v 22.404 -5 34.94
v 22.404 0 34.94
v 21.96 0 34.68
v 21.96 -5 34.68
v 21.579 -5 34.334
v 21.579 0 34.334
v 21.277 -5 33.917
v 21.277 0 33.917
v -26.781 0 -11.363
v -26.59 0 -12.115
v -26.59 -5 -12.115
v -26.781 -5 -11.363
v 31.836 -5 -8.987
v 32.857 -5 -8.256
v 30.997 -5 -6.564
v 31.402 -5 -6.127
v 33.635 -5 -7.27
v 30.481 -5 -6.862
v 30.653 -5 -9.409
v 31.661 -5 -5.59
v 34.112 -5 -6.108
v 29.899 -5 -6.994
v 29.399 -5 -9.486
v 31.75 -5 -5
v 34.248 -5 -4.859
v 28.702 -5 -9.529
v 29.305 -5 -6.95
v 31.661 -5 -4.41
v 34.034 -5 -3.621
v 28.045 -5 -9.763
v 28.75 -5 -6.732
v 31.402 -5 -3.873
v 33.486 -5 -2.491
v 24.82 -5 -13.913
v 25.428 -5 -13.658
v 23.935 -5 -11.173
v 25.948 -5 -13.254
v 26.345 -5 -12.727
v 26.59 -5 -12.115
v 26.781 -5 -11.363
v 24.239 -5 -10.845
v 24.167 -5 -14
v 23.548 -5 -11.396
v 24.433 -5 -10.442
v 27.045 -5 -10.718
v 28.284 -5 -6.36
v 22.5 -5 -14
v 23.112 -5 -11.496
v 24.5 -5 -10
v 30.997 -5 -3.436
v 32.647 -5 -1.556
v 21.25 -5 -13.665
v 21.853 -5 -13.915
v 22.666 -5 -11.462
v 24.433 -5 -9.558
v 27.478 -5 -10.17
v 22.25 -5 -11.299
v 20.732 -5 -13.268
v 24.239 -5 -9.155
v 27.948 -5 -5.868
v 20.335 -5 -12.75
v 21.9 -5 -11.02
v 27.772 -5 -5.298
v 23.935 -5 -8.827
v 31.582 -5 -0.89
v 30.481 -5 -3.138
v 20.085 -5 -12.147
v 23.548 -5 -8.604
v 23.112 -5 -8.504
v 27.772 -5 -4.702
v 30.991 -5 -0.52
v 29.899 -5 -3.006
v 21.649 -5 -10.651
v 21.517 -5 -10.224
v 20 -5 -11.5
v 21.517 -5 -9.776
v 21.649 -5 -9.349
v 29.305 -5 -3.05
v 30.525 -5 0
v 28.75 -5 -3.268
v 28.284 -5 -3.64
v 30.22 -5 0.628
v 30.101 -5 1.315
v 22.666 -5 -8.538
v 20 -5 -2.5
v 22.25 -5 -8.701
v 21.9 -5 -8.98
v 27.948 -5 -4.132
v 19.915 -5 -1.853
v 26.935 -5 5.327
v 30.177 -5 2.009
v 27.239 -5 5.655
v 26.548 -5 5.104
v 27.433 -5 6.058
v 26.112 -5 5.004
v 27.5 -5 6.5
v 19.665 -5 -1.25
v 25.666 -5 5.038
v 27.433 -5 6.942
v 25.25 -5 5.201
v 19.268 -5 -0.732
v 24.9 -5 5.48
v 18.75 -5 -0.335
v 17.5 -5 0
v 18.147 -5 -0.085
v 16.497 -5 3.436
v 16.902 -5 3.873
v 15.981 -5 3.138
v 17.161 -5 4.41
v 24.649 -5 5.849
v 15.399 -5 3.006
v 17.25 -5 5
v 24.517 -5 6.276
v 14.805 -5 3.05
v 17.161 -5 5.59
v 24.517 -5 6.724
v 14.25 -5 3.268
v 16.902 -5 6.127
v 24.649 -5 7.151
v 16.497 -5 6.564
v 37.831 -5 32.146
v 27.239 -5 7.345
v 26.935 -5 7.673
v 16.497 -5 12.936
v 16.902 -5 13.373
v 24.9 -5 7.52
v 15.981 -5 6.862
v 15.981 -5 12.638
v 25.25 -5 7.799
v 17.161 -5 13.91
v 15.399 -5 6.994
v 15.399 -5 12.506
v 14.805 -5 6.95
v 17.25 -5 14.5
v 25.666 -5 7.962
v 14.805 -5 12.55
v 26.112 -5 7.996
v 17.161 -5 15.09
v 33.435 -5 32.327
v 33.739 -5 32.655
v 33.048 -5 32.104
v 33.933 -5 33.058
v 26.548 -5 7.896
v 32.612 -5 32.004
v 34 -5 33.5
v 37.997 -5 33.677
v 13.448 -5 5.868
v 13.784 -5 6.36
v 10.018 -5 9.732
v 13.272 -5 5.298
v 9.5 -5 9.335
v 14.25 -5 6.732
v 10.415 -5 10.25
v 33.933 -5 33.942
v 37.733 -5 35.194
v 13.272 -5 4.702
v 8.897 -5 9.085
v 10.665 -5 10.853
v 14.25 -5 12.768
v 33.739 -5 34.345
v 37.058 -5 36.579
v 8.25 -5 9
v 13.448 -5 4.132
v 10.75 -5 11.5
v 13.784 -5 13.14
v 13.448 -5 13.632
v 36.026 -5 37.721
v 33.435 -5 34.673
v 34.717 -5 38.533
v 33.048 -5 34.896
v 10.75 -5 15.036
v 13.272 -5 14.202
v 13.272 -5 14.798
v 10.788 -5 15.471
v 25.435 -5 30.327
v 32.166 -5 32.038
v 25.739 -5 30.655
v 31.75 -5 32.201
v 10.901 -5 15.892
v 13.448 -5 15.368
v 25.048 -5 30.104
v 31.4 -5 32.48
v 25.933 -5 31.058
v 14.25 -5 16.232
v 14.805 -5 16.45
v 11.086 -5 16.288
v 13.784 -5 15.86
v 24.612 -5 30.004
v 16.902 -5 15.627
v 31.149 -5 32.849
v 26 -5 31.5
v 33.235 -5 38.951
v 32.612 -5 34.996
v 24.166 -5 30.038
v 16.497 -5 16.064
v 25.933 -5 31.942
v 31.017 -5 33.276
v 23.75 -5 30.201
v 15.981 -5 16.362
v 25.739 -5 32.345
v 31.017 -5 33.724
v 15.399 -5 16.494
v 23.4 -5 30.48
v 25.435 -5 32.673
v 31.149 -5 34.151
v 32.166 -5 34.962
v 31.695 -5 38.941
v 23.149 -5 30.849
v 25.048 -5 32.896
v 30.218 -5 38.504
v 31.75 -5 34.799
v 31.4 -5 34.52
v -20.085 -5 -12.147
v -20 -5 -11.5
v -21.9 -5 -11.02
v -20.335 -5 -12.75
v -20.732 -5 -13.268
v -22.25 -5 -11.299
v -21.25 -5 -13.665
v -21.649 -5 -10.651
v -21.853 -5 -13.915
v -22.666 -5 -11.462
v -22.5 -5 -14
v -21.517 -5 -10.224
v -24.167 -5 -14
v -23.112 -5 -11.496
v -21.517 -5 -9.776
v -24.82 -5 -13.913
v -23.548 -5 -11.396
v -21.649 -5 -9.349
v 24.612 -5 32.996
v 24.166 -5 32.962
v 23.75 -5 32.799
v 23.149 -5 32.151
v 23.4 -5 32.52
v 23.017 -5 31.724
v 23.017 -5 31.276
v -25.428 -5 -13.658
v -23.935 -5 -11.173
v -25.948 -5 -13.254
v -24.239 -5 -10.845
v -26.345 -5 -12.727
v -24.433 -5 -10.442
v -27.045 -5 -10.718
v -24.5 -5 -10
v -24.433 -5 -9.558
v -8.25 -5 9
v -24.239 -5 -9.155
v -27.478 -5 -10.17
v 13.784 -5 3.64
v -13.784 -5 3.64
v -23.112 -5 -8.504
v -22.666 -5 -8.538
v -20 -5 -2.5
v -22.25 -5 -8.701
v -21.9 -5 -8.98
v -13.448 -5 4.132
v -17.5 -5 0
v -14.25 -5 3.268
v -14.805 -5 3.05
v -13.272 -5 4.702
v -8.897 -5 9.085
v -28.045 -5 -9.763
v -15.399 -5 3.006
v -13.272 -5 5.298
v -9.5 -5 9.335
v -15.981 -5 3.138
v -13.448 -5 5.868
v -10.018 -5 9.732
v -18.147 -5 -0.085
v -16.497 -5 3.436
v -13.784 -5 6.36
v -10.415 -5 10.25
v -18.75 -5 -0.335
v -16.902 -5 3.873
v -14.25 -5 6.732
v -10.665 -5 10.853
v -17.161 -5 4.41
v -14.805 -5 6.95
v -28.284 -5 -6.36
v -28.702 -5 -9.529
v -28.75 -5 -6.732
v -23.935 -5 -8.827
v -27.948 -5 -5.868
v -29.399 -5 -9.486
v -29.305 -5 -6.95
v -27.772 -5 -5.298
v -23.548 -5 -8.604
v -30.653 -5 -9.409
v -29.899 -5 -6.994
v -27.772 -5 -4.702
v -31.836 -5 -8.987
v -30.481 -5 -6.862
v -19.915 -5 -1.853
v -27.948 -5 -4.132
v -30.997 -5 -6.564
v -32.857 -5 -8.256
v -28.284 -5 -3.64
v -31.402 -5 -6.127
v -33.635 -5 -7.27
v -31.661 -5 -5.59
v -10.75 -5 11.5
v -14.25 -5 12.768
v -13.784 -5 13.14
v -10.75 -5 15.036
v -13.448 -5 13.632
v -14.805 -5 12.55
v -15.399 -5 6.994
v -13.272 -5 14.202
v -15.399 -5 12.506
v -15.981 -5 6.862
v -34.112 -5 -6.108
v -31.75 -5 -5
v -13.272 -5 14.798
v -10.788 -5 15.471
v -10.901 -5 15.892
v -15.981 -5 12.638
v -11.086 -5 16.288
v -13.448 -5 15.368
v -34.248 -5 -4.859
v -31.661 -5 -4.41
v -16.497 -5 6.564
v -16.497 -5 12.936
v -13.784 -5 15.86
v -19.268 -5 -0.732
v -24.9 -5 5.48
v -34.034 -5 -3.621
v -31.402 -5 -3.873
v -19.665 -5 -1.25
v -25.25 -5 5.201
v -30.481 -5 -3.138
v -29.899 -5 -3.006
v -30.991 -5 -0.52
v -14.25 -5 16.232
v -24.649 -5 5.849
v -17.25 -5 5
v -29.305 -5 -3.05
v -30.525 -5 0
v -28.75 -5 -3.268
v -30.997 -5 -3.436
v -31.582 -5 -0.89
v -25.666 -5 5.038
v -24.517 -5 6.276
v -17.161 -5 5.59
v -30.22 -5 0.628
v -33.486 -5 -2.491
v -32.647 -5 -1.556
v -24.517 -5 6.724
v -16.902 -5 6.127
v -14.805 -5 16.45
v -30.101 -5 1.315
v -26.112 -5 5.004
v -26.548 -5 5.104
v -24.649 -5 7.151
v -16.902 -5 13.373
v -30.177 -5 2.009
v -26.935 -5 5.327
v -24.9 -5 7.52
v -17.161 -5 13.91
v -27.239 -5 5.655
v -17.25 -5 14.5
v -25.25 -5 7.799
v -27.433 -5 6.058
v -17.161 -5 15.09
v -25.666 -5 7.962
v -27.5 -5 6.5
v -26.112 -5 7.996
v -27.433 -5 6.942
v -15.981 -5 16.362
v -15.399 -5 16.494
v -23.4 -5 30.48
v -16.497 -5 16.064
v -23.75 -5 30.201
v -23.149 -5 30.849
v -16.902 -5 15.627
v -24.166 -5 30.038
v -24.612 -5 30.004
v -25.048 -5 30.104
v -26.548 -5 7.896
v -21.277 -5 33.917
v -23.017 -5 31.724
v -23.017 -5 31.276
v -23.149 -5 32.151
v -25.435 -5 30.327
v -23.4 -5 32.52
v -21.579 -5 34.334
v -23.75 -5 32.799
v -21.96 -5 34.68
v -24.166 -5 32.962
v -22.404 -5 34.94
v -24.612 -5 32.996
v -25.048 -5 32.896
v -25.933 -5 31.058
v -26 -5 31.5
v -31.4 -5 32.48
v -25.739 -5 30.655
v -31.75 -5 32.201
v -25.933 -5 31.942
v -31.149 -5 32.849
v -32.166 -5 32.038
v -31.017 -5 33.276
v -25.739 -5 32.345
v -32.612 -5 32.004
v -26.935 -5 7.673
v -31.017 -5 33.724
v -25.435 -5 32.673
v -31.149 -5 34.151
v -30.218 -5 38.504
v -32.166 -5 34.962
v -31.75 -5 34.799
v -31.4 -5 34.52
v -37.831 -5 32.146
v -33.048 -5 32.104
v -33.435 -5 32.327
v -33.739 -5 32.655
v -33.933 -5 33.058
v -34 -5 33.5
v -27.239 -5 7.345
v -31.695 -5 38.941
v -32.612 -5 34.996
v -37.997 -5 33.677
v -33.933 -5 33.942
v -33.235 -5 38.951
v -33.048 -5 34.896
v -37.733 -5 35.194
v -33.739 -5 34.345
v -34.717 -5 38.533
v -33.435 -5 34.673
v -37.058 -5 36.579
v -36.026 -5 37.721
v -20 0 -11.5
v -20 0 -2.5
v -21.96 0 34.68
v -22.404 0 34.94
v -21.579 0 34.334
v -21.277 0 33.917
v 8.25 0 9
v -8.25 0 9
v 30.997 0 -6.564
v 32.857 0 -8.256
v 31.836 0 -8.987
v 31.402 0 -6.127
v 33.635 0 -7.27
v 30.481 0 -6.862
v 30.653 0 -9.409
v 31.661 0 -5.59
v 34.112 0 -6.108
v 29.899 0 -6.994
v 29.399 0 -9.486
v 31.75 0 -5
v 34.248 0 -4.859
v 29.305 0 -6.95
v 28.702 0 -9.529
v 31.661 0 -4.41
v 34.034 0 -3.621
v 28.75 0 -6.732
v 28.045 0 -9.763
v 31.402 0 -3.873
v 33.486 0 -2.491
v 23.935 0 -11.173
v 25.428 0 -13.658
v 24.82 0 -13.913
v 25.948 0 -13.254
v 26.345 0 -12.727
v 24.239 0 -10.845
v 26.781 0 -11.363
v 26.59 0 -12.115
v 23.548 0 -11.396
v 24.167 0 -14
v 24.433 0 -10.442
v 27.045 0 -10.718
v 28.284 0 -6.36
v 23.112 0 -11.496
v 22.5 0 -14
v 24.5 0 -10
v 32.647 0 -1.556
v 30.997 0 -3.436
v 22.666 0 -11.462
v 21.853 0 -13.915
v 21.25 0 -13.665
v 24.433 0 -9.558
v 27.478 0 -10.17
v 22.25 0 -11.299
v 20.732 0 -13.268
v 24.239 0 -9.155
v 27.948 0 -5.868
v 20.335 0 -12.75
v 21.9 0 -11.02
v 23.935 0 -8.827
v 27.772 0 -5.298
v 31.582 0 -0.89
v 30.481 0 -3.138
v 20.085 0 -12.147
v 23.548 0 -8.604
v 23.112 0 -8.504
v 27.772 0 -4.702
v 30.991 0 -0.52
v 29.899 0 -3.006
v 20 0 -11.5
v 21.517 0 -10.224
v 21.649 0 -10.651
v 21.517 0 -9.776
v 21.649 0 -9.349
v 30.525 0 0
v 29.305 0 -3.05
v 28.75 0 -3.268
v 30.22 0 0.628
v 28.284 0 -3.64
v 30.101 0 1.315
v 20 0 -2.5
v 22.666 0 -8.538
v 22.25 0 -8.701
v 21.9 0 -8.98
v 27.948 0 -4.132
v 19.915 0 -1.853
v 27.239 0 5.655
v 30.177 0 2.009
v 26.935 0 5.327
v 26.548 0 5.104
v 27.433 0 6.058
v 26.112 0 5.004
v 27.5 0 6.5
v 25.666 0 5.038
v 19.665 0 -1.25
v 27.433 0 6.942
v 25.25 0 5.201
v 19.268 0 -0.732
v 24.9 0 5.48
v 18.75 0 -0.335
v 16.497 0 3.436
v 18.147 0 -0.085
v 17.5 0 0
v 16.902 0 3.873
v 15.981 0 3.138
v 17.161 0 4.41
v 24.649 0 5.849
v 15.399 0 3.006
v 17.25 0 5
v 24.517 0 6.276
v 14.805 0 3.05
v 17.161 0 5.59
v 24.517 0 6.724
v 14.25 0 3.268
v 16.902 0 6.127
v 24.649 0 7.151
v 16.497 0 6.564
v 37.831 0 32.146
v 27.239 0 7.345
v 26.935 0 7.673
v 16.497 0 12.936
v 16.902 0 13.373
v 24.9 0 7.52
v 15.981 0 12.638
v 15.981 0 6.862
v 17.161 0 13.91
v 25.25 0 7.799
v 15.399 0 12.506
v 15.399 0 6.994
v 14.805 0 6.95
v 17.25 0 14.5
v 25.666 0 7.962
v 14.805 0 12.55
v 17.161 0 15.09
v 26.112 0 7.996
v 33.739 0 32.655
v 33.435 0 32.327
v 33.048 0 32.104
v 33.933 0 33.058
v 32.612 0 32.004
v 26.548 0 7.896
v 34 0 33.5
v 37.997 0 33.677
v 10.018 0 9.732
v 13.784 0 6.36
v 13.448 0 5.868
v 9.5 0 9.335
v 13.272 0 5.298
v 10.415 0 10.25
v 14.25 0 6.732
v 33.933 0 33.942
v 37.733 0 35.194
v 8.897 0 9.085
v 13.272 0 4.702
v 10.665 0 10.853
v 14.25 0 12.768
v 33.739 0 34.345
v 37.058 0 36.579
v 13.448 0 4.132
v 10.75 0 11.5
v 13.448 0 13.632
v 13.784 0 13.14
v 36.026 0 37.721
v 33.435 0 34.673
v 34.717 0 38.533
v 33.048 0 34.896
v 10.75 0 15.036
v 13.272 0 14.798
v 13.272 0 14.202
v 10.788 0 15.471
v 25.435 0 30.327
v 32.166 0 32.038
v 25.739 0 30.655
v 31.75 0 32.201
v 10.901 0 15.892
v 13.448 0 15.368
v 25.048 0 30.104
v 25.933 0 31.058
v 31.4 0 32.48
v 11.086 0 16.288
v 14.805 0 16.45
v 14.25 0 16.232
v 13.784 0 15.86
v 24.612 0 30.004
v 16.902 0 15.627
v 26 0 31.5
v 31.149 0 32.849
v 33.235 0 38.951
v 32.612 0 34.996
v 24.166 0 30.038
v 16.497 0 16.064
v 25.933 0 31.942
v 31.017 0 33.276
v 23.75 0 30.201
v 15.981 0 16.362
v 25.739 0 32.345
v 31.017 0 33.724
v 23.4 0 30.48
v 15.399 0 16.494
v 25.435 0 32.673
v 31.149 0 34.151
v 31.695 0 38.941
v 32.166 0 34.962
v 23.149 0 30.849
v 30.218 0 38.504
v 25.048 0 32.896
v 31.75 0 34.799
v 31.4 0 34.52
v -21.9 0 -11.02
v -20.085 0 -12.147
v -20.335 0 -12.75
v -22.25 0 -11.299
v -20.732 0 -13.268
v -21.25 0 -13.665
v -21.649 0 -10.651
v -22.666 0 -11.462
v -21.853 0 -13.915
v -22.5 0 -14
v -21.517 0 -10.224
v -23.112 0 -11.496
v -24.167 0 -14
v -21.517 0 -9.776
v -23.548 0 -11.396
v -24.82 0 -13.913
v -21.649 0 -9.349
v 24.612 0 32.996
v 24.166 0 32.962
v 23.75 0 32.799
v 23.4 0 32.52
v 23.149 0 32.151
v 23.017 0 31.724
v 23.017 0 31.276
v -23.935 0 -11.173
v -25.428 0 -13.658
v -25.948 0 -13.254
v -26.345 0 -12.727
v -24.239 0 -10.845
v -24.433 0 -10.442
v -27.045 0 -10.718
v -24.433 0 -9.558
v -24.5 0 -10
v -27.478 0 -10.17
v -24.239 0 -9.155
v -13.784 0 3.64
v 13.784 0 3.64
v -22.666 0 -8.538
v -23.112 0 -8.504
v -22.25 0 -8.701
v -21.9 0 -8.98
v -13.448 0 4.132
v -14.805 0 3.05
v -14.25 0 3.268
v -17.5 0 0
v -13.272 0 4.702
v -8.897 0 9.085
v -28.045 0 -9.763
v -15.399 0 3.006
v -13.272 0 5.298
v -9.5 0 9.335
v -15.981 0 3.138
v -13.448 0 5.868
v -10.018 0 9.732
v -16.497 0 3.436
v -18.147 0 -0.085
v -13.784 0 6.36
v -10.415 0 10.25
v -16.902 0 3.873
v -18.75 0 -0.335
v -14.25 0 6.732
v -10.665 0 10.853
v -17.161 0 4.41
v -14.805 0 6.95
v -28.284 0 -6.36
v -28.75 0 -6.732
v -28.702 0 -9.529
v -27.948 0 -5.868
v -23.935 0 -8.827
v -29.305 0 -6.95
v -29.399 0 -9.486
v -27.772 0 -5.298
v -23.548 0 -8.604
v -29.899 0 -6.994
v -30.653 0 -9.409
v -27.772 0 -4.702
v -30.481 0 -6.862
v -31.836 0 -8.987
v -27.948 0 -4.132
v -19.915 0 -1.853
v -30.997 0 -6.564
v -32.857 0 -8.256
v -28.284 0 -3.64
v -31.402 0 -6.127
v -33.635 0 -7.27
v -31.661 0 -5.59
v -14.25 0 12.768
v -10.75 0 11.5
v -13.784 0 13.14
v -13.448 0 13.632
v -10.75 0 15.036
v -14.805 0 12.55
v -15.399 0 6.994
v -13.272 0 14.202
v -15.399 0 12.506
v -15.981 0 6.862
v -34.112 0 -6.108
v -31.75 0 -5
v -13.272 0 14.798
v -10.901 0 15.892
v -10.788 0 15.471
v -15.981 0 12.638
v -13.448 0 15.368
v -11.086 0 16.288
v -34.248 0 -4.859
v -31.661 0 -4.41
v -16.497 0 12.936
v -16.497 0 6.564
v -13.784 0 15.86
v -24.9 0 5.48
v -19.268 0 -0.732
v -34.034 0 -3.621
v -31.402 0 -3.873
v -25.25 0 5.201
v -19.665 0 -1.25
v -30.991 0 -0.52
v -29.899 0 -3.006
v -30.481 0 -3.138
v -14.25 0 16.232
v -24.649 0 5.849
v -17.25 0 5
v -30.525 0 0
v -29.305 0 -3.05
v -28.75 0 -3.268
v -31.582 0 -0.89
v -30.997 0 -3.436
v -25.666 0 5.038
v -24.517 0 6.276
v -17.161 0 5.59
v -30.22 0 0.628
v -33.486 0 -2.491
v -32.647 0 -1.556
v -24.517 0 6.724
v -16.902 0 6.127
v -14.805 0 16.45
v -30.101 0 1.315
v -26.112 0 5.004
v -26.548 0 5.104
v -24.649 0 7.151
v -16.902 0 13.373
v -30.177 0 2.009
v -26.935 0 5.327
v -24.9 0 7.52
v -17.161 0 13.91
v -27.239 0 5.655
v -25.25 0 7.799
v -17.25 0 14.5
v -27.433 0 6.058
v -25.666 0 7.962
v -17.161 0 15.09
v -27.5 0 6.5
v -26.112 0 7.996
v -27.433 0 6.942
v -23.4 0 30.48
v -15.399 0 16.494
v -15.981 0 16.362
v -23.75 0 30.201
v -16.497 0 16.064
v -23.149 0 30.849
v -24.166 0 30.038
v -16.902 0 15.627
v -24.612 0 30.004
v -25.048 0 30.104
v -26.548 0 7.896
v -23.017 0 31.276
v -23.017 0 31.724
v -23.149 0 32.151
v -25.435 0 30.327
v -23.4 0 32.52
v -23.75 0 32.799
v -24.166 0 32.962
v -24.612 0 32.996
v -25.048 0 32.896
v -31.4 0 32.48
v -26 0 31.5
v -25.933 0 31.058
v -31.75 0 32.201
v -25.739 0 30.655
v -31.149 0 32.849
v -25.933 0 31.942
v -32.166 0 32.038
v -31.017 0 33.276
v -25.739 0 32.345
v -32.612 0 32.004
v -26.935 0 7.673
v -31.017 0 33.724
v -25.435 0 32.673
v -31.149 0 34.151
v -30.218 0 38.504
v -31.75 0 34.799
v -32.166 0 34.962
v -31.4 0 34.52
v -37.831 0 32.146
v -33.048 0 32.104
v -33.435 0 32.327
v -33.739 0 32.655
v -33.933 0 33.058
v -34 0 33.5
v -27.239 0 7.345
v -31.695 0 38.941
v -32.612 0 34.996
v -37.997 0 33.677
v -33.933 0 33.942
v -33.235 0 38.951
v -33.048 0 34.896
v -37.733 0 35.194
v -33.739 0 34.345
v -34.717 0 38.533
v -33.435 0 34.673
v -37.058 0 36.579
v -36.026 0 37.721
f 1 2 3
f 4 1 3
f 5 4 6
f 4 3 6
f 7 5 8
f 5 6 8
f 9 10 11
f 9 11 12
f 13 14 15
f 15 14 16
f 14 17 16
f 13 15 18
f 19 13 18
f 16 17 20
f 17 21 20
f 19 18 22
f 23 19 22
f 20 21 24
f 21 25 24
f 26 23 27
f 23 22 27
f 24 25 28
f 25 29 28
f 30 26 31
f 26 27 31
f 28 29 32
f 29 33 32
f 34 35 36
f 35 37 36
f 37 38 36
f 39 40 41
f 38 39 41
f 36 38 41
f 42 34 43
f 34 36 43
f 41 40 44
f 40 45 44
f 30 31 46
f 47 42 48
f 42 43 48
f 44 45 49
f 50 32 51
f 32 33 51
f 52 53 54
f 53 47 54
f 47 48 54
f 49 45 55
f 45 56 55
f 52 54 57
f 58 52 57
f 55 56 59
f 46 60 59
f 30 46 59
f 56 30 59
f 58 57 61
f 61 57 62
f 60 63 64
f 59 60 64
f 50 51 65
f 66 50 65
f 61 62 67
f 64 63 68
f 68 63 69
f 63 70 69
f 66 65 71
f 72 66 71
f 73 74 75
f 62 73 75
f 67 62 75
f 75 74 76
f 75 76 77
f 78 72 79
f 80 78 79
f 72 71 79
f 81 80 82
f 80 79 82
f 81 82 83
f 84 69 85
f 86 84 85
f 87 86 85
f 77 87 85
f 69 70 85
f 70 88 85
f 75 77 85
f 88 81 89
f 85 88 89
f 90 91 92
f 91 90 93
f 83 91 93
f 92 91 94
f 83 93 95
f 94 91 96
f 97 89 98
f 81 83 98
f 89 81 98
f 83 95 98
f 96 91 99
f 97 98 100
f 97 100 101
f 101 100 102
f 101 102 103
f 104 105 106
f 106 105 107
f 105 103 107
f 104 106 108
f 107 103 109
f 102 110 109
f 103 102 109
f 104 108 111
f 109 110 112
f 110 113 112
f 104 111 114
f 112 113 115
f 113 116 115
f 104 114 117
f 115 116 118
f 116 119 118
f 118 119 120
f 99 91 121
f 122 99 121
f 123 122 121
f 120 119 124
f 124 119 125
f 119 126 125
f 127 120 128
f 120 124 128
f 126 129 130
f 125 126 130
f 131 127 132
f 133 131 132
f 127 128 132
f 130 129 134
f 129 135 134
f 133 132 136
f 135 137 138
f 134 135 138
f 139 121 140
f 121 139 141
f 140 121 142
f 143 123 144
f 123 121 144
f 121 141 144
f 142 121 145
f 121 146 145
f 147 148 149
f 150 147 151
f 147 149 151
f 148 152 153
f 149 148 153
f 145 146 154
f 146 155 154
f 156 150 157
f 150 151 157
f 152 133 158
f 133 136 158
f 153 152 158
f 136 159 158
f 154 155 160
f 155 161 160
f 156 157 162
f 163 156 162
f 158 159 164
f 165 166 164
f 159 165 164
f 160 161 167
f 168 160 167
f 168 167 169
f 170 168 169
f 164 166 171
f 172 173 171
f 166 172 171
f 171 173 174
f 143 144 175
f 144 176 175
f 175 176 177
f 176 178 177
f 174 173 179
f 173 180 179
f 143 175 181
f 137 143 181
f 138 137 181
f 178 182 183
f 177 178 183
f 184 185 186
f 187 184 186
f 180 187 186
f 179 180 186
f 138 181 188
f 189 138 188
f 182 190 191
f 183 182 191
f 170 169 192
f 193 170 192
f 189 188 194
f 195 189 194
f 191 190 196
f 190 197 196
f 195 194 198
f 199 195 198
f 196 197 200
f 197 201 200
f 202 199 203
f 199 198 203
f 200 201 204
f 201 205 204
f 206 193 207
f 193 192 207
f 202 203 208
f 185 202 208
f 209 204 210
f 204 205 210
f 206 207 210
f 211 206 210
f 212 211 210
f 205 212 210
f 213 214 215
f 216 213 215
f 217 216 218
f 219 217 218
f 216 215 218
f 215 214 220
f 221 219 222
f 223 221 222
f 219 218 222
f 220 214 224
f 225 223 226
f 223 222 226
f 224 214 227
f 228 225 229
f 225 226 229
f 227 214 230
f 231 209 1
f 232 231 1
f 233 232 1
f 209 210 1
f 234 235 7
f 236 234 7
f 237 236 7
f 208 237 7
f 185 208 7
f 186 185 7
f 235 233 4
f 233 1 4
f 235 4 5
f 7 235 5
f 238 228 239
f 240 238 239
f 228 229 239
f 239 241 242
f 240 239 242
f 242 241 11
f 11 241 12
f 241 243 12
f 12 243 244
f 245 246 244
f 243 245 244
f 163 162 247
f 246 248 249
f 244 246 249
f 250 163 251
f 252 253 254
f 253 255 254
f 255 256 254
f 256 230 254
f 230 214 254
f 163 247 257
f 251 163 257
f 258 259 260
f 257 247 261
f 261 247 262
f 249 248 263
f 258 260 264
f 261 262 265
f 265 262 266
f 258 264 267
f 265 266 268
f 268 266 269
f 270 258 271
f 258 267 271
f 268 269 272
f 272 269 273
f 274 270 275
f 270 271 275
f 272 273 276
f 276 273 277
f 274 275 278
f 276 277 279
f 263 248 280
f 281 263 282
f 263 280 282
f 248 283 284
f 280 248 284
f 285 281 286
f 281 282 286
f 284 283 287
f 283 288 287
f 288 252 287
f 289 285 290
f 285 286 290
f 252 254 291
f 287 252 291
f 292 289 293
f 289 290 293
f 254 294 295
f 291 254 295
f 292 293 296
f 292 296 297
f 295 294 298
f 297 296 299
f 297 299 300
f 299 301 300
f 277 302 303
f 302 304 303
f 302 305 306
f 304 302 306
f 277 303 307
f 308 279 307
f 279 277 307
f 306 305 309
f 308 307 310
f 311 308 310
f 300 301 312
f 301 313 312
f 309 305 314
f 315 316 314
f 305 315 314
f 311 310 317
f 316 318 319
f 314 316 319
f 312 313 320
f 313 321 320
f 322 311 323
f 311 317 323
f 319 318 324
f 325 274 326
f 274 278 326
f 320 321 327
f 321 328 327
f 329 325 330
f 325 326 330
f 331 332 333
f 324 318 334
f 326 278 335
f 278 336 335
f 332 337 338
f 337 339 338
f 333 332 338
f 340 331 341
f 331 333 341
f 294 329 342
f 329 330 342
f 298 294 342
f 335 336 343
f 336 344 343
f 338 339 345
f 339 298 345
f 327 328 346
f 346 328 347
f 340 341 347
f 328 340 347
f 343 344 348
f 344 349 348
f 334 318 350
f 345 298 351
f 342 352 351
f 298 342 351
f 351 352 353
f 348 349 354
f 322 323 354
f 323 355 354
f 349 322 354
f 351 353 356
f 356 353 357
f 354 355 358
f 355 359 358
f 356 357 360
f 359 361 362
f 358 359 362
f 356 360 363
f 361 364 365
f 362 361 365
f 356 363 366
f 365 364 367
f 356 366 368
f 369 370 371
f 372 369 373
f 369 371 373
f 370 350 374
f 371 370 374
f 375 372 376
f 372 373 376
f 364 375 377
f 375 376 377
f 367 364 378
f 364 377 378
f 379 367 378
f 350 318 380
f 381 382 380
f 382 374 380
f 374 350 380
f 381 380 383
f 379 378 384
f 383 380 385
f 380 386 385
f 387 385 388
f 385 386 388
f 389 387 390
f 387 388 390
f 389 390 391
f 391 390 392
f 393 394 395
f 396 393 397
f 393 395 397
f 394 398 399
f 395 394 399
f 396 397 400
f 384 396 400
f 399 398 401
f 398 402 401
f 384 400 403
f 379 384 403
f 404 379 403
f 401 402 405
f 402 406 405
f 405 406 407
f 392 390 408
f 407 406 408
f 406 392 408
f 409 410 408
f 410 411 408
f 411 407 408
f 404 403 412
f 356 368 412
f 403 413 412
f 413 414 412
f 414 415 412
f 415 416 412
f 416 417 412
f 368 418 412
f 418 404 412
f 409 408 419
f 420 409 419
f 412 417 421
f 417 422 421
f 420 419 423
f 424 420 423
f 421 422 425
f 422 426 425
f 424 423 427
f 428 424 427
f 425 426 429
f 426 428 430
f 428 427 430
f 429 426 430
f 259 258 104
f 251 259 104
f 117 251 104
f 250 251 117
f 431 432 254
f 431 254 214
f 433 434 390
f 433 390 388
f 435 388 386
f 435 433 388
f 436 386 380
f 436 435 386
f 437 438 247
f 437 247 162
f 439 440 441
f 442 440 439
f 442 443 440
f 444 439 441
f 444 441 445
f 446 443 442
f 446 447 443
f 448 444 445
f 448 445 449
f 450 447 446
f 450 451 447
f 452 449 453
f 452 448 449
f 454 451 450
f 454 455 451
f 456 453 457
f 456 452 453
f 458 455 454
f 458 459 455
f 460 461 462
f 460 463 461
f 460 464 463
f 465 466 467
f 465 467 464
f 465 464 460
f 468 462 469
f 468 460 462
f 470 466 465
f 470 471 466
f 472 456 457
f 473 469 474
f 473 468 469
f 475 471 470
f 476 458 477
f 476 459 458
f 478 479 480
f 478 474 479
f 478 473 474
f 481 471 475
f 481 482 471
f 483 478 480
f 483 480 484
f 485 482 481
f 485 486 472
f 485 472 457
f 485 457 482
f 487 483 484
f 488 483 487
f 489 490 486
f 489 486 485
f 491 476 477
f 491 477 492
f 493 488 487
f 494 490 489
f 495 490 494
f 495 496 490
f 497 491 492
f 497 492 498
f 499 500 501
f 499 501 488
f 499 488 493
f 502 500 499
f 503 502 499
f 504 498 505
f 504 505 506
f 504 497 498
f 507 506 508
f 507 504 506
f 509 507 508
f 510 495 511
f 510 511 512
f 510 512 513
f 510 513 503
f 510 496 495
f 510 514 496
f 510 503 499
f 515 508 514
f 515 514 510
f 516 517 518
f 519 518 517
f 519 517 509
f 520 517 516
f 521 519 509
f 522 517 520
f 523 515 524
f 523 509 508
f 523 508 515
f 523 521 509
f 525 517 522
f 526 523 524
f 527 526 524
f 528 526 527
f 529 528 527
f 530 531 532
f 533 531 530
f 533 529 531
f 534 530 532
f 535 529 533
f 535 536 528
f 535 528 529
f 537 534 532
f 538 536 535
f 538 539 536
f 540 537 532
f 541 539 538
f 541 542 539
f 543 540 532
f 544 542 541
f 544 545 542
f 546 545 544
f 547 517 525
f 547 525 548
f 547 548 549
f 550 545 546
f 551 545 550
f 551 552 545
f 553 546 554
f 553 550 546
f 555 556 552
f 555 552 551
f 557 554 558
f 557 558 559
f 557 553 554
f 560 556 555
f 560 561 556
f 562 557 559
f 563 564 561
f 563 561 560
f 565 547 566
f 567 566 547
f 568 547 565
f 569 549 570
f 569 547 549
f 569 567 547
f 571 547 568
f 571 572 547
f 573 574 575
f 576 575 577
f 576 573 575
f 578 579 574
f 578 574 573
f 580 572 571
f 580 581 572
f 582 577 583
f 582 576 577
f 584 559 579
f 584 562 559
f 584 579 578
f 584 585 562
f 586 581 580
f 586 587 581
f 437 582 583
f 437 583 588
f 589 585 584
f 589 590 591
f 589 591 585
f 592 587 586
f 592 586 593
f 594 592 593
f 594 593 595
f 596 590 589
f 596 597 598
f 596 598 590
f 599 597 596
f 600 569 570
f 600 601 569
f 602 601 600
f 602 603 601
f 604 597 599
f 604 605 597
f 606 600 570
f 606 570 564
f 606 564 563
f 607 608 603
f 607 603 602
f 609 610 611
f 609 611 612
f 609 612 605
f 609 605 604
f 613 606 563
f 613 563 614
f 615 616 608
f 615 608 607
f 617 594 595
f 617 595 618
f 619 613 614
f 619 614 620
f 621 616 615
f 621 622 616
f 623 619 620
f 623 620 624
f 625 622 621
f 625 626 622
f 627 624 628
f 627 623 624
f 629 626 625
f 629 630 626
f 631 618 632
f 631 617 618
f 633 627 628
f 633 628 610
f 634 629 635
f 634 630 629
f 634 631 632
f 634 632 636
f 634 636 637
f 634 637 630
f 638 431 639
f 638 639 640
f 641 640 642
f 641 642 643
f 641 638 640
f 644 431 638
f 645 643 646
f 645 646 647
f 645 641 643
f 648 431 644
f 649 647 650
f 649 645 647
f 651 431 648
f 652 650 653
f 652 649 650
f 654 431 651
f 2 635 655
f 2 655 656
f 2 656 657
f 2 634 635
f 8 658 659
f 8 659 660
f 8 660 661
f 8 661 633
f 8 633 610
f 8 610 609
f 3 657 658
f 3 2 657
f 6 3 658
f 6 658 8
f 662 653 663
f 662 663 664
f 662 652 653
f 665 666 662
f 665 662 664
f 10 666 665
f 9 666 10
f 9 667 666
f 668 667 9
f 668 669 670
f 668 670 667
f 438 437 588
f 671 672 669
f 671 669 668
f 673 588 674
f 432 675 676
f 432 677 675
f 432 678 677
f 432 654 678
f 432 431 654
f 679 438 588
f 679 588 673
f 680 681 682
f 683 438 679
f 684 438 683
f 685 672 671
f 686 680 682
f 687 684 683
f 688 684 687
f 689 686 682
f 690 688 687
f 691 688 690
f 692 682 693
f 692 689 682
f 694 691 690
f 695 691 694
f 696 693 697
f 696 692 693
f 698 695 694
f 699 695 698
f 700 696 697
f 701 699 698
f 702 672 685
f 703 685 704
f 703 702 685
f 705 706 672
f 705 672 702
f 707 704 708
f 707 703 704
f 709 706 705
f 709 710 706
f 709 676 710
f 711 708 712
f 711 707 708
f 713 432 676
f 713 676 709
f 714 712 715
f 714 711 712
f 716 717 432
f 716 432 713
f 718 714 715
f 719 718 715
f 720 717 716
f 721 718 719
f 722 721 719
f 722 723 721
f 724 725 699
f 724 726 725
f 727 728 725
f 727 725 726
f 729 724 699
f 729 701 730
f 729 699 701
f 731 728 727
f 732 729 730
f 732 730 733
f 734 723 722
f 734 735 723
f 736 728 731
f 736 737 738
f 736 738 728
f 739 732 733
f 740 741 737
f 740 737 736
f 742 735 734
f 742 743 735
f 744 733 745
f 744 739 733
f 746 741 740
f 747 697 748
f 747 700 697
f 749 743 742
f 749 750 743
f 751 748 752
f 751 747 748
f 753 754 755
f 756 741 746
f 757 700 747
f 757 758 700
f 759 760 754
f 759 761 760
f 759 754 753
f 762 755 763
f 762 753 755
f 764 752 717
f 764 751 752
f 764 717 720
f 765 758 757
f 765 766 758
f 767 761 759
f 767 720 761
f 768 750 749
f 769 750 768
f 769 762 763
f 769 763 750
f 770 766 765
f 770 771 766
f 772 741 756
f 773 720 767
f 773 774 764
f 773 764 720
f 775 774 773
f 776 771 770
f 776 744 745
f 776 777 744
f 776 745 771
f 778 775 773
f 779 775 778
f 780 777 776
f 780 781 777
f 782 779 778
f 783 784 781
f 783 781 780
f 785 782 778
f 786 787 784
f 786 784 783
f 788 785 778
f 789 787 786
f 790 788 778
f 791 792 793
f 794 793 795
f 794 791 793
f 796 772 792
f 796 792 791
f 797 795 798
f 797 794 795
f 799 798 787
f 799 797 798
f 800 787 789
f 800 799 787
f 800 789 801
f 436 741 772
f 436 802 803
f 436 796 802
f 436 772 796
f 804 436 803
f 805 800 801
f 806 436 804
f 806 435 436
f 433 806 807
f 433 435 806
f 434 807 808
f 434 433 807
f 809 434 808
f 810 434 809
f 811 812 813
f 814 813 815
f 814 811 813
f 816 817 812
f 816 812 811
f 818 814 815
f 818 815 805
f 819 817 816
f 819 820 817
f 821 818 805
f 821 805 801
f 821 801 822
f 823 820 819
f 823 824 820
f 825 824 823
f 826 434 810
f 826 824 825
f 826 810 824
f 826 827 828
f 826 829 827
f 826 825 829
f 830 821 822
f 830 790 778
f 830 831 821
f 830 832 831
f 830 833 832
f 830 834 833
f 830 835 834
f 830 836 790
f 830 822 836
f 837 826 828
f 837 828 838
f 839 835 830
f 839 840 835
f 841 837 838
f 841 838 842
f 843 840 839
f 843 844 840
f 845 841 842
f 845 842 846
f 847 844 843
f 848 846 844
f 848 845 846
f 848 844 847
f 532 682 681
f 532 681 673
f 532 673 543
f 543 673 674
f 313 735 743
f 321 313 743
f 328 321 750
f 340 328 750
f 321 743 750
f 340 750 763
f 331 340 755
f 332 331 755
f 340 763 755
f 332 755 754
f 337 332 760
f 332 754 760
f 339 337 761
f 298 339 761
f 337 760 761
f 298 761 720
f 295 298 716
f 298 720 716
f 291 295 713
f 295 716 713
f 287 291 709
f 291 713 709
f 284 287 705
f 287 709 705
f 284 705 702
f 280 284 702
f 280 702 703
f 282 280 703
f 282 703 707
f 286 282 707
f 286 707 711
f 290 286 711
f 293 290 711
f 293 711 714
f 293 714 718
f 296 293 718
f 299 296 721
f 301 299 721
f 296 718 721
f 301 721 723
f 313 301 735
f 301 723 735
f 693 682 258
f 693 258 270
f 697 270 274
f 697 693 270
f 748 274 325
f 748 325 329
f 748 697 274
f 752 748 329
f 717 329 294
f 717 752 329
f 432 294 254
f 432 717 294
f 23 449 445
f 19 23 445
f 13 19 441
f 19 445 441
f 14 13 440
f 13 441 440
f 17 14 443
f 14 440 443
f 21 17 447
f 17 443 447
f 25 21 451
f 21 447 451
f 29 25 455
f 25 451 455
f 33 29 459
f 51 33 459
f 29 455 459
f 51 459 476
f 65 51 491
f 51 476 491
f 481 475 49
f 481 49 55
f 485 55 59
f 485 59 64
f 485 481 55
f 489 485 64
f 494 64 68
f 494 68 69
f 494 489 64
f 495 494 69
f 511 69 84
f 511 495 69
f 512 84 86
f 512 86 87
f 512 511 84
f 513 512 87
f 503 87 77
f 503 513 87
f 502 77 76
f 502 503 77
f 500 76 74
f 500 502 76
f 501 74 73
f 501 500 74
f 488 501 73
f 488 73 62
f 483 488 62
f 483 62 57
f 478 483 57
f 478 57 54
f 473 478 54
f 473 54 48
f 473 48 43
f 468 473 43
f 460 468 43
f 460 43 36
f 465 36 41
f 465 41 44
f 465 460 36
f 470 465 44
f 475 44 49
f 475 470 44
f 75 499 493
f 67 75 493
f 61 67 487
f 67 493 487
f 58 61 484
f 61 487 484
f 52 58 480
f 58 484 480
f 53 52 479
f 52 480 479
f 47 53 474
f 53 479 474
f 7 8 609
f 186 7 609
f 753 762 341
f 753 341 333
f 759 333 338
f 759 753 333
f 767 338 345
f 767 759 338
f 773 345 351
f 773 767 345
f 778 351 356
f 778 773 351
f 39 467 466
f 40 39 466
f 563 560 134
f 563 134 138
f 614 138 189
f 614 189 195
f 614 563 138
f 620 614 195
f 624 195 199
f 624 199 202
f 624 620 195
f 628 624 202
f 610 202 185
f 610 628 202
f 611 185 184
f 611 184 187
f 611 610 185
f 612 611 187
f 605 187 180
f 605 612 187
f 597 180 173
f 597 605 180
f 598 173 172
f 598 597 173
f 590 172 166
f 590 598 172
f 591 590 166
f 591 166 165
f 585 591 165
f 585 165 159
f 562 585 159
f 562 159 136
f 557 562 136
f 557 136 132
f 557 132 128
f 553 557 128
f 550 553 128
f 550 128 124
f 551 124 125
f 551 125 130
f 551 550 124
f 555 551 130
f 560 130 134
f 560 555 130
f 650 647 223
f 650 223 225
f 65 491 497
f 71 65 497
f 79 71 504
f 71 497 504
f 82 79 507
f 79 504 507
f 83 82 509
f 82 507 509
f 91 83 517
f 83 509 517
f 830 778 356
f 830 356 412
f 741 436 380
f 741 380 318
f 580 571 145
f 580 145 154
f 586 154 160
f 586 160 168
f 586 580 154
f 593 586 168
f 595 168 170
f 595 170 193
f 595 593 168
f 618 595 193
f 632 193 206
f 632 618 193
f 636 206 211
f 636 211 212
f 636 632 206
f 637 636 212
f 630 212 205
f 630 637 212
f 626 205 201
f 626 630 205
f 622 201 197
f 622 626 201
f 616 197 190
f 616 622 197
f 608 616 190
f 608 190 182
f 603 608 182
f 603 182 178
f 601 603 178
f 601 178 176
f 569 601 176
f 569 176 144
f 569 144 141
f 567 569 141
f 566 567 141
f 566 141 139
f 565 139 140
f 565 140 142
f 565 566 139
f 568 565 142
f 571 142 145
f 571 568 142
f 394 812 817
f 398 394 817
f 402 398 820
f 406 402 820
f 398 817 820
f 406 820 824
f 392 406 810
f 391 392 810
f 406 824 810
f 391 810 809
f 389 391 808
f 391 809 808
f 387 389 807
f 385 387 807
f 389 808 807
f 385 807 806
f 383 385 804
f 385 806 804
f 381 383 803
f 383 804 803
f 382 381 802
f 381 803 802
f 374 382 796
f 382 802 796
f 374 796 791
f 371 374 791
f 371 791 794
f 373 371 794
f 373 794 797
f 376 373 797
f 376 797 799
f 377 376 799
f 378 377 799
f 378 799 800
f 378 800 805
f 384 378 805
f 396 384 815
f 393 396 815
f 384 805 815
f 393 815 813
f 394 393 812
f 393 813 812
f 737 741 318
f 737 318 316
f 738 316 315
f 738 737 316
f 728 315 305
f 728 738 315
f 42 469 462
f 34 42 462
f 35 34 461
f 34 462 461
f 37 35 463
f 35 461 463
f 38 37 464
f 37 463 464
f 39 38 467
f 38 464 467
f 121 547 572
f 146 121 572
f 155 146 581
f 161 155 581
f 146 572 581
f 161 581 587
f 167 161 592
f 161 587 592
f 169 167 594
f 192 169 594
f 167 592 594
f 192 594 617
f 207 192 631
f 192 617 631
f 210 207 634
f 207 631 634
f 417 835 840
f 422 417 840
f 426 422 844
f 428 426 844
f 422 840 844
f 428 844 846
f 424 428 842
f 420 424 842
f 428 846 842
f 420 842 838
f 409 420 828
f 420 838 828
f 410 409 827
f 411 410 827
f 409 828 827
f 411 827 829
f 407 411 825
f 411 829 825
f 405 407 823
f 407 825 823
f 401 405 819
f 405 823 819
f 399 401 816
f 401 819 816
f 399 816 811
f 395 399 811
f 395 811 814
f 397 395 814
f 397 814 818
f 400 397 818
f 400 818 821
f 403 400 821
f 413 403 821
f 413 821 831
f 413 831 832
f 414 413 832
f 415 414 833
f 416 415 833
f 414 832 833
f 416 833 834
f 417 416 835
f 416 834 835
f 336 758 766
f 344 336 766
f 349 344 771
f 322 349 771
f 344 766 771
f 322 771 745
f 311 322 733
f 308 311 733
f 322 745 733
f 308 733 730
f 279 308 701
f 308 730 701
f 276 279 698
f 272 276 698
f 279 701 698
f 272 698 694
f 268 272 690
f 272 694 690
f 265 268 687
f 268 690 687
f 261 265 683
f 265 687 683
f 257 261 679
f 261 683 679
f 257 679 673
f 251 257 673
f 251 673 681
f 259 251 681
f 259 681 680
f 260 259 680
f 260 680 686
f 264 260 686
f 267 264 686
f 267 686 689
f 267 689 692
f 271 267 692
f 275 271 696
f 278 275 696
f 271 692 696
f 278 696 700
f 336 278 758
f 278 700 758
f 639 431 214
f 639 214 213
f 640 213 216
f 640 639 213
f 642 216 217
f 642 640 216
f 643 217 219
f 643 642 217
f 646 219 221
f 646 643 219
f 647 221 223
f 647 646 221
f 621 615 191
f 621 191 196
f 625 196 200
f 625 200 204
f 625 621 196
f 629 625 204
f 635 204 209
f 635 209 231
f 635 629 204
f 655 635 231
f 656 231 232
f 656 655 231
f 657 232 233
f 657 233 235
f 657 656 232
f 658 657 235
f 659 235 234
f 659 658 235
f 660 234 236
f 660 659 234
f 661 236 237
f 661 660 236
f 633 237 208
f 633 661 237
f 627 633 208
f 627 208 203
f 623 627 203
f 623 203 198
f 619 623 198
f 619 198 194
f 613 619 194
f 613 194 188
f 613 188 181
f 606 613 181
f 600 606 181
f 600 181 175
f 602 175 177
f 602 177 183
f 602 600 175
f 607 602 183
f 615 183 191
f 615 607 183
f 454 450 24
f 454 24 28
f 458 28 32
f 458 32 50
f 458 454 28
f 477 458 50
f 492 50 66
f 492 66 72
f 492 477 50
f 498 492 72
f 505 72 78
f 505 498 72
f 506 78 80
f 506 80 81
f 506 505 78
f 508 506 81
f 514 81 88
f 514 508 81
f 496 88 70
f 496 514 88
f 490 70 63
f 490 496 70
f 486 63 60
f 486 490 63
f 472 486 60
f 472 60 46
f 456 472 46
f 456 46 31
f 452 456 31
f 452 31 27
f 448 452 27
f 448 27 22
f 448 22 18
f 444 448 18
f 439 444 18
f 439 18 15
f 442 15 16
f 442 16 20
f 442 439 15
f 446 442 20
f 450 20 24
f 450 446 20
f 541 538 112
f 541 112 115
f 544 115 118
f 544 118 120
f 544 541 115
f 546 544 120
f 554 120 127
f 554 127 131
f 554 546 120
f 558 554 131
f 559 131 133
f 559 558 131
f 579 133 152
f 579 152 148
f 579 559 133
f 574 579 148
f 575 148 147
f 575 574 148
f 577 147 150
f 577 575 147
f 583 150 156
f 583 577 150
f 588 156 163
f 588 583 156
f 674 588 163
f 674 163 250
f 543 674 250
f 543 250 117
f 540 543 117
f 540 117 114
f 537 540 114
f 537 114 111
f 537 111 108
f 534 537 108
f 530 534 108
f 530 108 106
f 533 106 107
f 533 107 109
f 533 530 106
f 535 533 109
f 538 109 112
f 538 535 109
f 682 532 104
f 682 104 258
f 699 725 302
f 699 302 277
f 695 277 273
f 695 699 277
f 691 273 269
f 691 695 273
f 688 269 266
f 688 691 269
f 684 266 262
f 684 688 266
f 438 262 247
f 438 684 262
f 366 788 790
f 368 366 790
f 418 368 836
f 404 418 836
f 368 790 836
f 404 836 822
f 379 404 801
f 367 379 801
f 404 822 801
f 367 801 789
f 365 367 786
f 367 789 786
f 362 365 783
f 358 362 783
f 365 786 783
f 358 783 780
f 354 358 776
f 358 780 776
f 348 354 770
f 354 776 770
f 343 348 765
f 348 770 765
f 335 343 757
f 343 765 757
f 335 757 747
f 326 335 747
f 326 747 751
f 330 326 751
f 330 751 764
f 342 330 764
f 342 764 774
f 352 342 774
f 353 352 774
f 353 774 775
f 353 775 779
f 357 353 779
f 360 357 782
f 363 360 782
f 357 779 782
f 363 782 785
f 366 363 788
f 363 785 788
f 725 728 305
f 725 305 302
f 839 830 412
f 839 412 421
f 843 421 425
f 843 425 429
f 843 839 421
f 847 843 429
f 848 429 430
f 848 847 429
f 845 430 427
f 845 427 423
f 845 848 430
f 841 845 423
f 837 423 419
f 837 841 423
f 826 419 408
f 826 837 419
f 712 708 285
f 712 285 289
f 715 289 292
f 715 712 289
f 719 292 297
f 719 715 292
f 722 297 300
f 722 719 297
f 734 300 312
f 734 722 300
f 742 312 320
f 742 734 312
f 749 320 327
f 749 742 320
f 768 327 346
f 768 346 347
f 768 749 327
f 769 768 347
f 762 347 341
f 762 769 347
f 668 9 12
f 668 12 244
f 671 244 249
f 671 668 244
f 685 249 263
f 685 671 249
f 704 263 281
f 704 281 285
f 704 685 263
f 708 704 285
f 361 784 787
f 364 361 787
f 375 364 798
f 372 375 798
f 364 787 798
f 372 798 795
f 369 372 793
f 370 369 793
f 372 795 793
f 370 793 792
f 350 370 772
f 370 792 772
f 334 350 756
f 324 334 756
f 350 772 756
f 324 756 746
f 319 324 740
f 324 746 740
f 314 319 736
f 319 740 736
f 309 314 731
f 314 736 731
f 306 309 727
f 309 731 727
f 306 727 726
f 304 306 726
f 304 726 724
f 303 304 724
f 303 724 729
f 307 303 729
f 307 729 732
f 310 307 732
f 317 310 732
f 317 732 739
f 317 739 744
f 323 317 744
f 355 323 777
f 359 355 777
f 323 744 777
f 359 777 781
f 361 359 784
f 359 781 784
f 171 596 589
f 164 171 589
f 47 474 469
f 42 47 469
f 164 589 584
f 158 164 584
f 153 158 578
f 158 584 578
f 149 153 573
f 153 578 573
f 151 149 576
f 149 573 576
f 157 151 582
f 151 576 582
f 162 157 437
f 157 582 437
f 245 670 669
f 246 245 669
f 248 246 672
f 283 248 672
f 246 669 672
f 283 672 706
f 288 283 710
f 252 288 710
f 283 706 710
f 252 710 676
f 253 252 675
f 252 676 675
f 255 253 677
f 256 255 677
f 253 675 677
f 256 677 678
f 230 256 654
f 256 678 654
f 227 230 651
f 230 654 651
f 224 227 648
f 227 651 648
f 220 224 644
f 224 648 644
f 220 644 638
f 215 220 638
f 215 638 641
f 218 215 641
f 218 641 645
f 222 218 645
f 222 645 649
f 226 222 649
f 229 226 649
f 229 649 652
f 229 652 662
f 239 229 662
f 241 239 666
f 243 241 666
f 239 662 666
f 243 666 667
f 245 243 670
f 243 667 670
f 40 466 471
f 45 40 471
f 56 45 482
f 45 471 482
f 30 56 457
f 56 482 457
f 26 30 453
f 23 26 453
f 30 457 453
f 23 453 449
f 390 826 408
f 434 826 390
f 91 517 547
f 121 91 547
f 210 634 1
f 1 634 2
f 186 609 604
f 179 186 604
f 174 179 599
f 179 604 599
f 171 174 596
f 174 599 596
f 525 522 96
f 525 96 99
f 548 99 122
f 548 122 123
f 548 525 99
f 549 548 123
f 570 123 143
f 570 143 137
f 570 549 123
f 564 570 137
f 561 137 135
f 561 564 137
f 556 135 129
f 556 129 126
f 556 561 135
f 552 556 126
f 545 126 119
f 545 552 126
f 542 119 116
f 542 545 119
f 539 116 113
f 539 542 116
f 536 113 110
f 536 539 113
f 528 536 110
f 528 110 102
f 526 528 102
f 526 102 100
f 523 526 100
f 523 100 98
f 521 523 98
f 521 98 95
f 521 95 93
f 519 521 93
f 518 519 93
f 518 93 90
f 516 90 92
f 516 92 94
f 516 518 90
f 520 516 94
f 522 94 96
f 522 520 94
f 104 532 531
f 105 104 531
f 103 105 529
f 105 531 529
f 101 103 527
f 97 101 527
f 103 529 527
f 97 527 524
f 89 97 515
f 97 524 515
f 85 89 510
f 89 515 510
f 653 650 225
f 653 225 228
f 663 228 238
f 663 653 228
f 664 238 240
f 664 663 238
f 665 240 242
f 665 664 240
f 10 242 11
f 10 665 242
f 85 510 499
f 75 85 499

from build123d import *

# Parameters (mm, degrees)
F0_R     = 2
F0_R_2   = 1.5
F1_DEPTH = 5


with BuildPart() as f1:
    # F0 (on Front) → F1 (new body)
    with BuildSketch(Plane.XZ):
        with BuildLine():
            ThreePointArc((20, -11.5), (20.732233, -13.267767), (22.5, -14))
            Line((22.5, -14), (24.166667, -14))
            ThreePointArc((24.166667, -14), (25.701518, -13.473381), (26.589744, -12.115385))
            Line((26.589744, -12.115385), (26.780755, -11.363276))
            ThreePointArc((26.780755, -11.363276), (27.747195, -9.946861), (29.398892, -9.486282))
            ThreePointArc((29.398892, -9.486282), (34.111538, -6.107692), (31.582114, -0.889847))
            ThreePointArc((31.582114, -0.889847), (30.350345, 0.303041), (30.176878, 2.008956))
            Line((30.176878, 2.008956), (37.830769, 32.146154))
            ThreePointArc((37.830769, 32.146154), (36.025514, 37.721463), (30.21772, 38.504118))
            Line((30.21772, 38.504118), (22.403935, 34.940405))
            ThreePointArc((22.403935, 34.940405), (21.76066, 34.516571), (21.276965, 33.917007))
            Line((21.276965, 33.917007), (11.08563, 16.287694))
            ThreePointArc((11.08563, 16.287694), (10.835365, 15.684211), (10.75, 15.036493))
            Line((10.75, 15.036493), (10.75, 11.5))
            ThreePointArc((10.75, 11.5), (10.017767, 9.732233), (8.25, 9))
            Line((8.25, 9), (0, 9))
            Line((0, 9), (0, 0))
            Line((0, 0), (17.5, 0))
            ThreePointArc((17.5, 0), (19.267767, -0.732233), (20, -2.5))
            Line((20, -2.5), (20, -11.5))
        make_face()
        with Locations((15.25, 5)):
            Circle(F0_R, mode=Mode.SUBTRACT)
        with Locations((23, -10)):
            Circle(F0_R_2, mode=Mode.SUBTRACT)
        with Locations((29.75, -5)):
            Circle(F0_R, mode=Mode.SUBTRACT)
        with Locations((26, 6.5)):
            Circle(F0_R_2, mode=Mode.SUBTRACT)
        with Locations((15.25, 14.5)):
            Circle(F0_R, mode=Mode.SUBTRACT)
        with Locations((24.5, 31.5)):
            Circle(F0_R_2, mode=Mode.SUBTRACT)
        with Locations((32.5, 33.5)):
            Circle(F0_R_2, mode=Mode.SUBTRACT)
    extrude(amount=F1_DEPTH)

    # F2: F1 across plane


with BuildPart() as f1_1:
    add(f1.part)
    add(f1.part.mirror(Plane.YZ))


solid = f1_1.part
